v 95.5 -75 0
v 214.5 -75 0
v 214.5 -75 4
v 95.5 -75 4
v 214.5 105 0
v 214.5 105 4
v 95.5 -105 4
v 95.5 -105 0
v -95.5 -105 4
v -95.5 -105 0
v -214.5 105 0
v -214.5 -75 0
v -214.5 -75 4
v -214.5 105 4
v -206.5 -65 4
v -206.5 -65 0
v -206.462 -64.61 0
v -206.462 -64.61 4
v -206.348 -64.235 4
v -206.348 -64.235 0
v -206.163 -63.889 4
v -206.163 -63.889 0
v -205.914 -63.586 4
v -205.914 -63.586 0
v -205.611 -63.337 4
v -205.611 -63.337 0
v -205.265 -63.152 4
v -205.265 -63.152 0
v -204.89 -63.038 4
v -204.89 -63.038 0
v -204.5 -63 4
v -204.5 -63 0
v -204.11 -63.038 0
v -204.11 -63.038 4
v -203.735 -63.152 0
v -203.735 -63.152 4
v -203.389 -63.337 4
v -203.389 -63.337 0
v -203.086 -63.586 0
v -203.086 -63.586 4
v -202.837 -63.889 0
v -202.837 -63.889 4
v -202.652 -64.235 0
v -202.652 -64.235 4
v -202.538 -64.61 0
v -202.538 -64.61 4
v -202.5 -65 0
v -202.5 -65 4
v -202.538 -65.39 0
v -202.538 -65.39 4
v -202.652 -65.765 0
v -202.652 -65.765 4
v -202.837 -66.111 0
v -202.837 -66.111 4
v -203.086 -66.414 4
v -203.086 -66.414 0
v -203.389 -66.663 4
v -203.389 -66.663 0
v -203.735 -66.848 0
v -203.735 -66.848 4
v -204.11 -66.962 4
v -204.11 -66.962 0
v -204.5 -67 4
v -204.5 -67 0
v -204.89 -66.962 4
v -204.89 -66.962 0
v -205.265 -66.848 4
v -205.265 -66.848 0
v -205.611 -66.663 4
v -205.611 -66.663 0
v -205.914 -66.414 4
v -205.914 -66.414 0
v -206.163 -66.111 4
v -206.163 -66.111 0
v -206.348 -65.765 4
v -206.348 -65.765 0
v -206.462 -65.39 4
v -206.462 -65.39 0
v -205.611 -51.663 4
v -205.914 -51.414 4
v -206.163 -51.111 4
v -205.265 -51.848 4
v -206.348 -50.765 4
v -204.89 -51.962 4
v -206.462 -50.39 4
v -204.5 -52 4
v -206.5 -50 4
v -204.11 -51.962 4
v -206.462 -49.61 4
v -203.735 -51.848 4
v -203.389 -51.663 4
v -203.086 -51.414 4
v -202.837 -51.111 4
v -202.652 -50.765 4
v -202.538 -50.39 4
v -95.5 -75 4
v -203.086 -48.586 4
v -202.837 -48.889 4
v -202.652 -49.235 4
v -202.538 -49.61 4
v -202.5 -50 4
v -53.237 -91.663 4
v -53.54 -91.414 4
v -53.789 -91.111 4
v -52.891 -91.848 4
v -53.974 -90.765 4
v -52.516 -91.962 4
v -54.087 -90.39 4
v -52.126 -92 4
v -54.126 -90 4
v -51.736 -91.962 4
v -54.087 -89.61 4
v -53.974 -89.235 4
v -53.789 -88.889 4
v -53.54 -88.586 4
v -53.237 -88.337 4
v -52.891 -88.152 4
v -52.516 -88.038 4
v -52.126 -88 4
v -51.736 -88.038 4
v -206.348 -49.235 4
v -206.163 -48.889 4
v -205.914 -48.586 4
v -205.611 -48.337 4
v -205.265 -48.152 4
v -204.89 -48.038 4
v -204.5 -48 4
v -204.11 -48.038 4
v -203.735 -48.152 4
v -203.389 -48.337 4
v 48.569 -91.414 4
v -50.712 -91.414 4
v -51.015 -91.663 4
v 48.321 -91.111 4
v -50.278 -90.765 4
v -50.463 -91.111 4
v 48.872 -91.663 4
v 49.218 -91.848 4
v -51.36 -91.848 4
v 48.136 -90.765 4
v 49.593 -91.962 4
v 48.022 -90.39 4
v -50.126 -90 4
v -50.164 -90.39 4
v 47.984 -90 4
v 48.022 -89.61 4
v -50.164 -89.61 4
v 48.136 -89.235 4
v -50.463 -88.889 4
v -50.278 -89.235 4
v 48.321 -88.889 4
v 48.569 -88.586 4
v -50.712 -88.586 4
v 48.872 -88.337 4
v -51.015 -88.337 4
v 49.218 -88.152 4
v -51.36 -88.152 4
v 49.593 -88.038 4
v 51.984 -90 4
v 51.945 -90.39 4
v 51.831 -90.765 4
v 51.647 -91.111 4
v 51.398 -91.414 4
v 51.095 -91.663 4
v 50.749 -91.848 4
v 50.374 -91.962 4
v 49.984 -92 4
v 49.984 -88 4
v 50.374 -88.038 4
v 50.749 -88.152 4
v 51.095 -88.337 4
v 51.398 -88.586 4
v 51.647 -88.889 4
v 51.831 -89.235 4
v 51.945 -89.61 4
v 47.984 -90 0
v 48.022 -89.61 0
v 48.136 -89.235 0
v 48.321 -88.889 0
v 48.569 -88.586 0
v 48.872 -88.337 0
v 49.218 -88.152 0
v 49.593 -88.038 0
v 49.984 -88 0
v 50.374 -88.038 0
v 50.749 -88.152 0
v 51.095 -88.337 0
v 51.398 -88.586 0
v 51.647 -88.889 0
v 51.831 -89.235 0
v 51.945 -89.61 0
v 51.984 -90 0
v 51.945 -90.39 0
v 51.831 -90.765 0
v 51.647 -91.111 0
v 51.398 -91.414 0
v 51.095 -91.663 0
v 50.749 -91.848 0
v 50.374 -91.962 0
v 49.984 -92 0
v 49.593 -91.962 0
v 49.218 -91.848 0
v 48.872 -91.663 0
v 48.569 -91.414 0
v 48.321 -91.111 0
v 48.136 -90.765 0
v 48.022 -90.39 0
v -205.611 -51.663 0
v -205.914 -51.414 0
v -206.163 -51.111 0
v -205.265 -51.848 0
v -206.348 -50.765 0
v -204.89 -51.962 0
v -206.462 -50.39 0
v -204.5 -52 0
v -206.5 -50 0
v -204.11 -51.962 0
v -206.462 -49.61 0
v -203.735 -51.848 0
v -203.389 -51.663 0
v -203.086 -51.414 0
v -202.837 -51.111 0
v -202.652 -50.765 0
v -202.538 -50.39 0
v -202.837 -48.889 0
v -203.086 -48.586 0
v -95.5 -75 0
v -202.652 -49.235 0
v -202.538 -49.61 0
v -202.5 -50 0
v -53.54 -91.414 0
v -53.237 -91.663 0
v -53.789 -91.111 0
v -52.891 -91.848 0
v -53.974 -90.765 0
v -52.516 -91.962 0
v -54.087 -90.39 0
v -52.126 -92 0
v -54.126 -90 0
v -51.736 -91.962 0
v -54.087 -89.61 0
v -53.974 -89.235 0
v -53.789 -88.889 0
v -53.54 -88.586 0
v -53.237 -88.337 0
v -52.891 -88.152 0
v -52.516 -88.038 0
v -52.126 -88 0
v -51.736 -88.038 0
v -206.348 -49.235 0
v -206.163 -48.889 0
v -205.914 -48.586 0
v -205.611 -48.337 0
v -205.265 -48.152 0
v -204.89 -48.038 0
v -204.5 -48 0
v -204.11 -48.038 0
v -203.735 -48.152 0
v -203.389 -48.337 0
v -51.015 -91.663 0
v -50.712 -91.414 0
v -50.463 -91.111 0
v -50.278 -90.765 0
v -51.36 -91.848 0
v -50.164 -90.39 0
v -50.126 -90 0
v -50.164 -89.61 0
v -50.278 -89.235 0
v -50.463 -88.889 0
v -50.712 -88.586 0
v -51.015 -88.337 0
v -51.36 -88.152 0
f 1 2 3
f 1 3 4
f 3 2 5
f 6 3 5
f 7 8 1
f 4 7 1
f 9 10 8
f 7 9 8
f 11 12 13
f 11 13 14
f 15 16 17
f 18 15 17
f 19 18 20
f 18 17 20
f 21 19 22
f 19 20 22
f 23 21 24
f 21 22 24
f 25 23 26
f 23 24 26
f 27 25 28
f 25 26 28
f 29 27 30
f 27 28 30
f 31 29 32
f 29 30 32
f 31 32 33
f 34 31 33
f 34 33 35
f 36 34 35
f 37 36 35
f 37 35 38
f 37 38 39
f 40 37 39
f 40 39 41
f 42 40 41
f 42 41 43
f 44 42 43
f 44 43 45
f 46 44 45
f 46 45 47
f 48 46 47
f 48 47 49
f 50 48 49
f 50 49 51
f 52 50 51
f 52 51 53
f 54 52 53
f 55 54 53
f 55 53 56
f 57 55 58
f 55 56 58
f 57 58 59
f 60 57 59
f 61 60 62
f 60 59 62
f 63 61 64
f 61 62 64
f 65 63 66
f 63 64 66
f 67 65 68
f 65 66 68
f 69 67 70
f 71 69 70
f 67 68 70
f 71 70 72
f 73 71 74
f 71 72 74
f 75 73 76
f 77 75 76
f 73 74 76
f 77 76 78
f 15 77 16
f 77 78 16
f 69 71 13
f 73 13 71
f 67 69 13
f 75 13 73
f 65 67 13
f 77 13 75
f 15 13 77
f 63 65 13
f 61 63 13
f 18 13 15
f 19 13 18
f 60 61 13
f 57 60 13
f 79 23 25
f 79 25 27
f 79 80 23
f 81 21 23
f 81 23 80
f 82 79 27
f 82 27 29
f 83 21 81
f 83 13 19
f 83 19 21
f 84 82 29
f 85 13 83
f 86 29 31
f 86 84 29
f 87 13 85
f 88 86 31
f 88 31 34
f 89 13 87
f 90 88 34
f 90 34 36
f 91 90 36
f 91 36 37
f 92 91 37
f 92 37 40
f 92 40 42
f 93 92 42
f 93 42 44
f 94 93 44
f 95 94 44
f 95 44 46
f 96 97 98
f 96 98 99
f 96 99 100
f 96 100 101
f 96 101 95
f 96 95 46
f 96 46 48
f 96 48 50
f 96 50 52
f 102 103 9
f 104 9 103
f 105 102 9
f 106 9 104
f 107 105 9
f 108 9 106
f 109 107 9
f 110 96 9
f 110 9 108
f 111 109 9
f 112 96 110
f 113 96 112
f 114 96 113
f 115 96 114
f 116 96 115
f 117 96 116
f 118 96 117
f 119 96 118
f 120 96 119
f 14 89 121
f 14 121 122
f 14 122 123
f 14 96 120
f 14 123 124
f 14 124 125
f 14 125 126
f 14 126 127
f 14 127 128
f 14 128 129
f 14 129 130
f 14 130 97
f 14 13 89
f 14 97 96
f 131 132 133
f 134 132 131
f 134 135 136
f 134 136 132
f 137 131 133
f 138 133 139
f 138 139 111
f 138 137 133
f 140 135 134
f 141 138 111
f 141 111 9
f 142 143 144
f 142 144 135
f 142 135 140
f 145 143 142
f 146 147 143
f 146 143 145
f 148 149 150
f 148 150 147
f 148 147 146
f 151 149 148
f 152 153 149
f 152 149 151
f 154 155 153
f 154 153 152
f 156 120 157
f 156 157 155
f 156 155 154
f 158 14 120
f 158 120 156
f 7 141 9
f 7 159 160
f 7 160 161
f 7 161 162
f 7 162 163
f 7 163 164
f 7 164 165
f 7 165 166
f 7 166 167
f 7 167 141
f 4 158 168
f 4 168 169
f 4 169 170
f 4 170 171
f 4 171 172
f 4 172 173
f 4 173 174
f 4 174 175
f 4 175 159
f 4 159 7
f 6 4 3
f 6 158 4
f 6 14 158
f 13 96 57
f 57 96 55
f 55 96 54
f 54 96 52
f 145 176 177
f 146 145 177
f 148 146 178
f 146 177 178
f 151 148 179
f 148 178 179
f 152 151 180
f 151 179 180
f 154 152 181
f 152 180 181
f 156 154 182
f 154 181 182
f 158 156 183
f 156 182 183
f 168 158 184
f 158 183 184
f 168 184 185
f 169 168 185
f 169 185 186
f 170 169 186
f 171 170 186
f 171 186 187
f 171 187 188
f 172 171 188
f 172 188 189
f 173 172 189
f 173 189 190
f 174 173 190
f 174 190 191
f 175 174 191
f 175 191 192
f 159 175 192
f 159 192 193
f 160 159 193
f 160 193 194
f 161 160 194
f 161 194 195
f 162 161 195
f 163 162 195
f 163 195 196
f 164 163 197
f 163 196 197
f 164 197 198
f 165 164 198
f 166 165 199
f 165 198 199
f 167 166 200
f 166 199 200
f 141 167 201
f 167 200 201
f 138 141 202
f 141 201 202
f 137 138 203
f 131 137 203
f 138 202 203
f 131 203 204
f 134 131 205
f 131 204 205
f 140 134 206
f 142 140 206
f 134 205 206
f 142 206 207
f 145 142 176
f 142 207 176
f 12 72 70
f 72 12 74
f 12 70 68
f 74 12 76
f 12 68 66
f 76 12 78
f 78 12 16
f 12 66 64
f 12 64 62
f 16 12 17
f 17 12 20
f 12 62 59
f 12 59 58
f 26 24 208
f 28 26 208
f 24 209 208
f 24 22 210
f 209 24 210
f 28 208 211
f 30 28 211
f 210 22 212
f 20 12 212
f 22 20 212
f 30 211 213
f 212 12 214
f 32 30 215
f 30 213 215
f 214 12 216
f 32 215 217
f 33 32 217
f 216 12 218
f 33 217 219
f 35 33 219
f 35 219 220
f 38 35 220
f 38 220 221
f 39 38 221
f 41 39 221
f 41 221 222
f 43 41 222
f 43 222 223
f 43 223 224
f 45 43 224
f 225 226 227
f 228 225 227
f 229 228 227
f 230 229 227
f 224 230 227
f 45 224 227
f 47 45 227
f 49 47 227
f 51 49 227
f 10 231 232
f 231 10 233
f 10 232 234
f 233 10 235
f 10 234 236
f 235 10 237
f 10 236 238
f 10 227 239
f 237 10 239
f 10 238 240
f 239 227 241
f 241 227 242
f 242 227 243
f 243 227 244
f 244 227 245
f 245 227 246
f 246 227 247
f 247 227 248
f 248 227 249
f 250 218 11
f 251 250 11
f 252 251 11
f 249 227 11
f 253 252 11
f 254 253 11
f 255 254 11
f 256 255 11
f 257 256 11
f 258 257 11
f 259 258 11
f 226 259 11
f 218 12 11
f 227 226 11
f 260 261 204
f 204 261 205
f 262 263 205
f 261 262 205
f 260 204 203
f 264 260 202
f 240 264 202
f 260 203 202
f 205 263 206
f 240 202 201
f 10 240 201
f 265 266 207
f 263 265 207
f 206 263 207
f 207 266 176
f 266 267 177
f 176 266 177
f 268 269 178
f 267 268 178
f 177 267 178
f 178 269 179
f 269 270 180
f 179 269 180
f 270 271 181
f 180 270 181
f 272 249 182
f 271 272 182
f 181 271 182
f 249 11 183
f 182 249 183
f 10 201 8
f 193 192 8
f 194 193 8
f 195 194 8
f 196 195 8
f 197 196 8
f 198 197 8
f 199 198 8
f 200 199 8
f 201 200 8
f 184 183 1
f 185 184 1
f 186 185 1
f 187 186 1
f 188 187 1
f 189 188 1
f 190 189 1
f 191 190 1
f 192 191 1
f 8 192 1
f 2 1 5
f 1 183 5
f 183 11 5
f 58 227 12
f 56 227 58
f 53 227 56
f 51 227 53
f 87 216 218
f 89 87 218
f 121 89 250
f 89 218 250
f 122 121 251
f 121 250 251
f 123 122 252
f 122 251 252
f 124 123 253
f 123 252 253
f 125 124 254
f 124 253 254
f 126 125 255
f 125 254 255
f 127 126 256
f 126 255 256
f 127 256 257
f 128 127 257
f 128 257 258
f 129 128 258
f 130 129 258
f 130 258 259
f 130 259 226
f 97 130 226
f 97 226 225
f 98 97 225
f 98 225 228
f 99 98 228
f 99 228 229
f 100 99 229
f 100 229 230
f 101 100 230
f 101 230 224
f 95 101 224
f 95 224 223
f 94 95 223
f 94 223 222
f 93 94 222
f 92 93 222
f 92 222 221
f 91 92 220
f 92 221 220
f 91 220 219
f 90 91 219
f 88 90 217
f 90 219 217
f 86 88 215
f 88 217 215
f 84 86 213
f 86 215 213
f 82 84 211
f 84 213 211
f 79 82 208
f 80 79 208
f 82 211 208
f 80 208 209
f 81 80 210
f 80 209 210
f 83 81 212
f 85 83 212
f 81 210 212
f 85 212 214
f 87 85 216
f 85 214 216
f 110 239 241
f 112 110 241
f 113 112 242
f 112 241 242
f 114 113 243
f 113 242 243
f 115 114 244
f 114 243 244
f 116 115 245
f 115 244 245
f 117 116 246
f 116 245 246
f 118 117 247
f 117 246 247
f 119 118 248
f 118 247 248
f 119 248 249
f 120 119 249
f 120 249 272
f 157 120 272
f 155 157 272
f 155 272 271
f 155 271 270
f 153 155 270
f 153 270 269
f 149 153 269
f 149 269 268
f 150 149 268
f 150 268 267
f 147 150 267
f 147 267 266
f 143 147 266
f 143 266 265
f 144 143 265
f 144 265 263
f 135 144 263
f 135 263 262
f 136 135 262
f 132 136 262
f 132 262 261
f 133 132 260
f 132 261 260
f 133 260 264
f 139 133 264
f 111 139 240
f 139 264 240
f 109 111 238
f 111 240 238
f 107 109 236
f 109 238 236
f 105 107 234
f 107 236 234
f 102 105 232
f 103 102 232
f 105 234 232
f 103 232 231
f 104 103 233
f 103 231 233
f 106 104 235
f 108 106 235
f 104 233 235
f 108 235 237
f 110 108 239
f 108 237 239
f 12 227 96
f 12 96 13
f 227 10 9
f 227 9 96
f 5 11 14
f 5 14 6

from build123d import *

# Parameters (mm, degrees)
SKETCH1_W           = 429
SKETCH1_H           = 210
BOSS_EXTRUDE1_DEPTH = 4
SKETCH2_W           = 119
SKETCH2_H           = 30
CUT_EXTRUDE1_DEPTH  = 4
SKETCH3_R           = 2
CUT_EXTRUDE2_DEPTH  = 239.854034925
SKETCH4_R           = 2
CUT_EXTRUDE3_DEPTH  = 239.854034925


with BuildPart() as part:
    # Sketch1 → Boss-Extrude1 (new body)
    with BuildSketch(Plane.XY):
        Rectangle(SKETCH1_W, SKETCH1_H)
    extrude(amount=BOSS_EXTRUDE1_DEPTH)

    # Sketch2 → Cut-Extrude1 (cut)
    with BuildSketch(Plane(origin=(0, 0, 0), x_dir=(-1, 0, 0), z_dir=(0, 0, -1))):
        with Locations((-155, -90)):
            Rectangle(SKETCH2_W, SKETCH2_H)
        with Locations((155, -90)):
            Rectangle(SKETCH2_W, SKETCH2_H)
    extrude(amount=-CUT_EXTRUDE1_DEPTH, mode=Mode.SUBTRACT)

    # Sketch3 → Cut-Extrude2 (cut, through all)
    with BuildSketch(Plane(origin=(0, 0, 0), x_dir=(-1, 0, 0), z_dir=(0, 0, -1))):
        with Locations((-49.983602513, -90)):
            Circle(SKETCH3_R)
        with Locations((52.125756906, -90)):
            Circle(SKETCH3_R)
    extrude(amount=-CUT_EXTRUDE2_DEPTH, mode=Mode.SUBTRACT)

    # Sketch4 → Cut-Extrude3 (cut, through all)
    with BuildSketch(Plane(origin=(0, 0, 0), x_dir=(-1, 0, 0), z_dir=(0, 0, -1))):
        with Locations((204.5, -65)):
            Circle(SKETCH4_R)
        with Locations((204.5, -50)):
            Circle(SKETCH4_R)
    extrude(amount=-CUT_EXTRUDE3_DEPTH, mode=Mode.SUBTRACT)


solid = part.part
